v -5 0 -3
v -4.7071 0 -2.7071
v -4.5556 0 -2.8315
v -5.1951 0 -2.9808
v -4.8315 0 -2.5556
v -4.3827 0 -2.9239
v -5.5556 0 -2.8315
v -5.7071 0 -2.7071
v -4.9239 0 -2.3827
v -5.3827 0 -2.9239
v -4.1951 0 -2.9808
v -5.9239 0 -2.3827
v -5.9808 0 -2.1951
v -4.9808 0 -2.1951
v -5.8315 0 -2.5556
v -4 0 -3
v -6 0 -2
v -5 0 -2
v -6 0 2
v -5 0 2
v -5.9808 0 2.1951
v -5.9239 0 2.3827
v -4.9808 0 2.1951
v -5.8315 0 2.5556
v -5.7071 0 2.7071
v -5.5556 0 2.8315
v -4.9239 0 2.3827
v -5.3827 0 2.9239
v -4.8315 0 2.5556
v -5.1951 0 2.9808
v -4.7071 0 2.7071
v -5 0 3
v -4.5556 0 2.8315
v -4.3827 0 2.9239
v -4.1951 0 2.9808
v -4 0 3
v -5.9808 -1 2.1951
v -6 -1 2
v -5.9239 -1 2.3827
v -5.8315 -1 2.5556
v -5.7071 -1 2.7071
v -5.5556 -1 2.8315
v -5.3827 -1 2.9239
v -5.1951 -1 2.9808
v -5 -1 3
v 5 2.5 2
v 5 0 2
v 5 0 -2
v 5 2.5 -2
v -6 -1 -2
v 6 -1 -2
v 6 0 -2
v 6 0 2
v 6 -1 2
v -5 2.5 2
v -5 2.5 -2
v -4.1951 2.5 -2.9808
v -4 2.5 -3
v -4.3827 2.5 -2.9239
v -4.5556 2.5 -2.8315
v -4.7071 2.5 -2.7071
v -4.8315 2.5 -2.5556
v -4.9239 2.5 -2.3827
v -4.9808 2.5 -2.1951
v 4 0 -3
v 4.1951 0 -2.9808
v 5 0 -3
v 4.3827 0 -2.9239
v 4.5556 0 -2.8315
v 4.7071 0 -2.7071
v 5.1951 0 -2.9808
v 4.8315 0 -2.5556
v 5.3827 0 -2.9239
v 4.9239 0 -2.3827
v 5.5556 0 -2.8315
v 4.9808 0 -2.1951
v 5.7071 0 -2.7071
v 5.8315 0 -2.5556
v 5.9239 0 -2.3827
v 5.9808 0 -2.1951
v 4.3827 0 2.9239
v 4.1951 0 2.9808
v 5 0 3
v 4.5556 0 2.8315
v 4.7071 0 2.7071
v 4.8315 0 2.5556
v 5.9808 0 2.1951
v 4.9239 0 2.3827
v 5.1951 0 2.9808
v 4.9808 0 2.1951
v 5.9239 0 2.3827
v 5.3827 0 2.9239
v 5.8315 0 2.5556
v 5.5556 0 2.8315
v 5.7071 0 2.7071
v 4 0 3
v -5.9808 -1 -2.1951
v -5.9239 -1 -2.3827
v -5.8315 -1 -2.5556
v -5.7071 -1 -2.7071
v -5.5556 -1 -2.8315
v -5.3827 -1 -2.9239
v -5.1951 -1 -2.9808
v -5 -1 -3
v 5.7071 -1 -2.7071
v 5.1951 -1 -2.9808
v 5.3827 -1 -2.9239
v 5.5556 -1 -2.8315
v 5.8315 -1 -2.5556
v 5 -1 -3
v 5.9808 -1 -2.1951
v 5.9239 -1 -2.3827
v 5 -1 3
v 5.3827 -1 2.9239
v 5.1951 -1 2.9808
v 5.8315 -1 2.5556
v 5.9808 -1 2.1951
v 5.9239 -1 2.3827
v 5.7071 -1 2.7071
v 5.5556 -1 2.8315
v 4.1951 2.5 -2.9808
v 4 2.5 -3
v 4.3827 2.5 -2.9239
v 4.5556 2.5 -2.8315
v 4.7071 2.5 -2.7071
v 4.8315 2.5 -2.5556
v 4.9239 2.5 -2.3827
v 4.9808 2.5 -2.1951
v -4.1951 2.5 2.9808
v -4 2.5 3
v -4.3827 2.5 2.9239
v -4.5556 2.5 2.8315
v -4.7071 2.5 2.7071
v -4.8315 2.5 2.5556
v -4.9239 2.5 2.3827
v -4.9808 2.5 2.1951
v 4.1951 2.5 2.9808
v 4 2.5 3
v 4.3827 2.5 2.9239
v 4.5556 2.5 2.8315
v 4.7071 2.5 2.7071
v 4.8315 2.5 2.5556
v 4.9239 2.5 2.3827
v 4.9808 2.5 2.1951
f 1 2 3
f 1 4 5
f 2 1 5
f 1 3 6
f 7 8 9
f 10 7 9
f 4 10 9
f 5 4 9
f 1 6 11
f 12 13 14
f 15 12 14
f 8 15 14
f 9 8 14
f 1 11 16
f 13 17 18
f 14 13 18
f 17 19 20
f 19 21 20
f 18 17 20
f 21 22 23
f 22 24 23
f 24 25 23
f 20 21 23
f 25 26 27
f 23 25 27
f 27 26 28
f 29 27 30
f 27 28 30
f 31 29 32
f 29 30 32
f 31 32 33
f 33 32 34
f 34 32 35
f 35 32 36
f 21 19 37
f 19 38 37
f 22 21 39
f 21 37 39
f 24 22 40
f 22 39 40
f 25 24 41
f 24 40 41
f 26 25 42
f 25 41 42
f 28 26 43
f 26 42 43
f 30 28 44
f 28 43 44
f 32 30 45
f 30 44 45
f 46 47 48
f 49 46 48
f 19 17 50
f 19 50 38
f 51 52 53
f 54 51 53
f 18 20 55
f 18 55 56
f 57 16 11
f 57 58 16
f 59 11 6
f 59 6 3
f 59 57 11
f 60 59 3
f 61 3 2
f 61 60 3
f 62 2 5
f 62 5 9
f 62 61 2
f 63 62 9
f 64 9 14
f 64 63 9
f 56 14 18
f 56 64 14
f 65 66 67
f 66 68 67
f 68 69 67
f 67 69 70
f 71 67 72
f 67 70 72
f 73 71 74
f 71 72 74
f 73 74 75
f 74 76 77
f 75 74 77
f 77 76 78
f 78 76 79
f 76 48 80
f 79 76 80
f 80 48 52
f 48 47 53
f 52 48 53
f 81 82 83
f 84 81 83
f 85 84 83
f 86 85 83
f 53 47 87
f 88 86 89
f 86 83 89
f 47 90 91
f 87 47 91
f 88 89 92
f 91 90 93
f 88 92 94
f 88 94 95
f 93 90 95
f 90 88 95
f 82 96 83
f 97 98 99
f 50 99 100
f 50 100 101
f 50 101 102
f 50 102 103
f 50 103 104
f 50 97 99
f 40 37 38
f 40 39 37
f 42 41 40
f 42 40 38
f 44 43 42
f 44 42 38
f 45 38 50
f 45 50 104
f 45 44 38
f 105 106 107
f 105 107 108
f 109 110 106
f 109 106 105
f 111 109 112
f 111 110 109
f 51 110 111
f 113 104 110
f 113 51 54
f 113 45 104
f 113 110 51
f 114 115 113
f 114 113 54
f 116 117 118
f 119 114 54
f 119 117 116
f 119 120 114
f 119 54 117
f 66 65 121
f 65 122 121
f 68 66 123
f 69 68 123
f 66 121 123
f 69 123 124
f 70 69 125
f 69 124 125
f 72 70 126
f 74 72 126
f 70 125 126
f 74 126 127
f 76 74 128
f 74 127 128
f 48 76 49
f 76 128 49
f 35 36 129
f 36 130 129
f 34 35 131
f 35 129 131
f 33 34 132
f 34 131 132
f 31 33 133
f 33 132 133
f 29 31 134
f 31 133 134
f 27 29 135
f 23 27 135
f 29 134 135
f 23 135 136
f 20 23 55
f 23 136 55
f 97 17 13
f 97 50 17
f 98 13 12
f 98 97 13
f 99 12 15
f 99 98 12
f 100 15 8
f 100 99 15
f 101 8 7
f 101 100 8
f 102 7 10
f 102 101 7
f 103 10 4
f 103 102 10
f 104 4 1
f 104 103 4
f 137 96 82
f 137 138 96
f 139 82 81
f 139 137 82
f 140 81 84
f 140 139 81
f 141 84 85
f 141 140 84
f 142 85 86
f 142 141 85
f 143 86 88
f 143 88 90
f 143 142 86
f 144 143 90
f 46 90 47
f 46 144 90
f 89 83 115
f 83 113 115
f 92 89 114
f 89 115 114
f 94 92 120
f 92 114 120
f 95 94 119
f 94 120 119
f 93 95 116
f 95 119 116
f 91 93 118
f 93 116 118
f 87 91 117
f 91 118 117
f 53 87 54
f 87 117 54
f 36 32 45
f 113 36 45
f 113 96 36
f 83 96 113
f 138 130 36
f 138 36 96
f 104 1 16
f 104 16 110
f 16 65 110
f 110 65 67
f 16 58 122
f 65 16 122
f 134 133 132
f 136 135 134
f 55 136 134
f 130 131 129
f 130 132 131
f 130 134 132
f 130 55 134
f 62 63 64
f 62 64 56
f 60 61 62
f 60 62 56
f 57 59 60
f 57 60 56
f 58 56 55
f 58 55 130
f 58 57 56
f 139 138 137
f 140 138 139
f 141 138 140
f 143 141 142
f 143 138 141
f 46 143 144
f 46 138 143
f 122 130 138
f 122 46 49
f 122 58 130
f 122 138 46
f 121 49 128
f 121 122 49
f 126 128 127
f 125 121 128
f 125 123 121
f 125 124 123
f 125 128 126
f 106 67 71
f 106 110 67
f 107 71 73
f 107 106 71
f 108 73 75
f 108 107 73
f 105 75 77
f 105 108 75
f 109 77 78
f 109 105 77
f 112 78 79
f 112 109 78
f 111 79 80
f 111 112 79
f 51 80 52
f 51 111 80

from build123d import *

# Parameters (mm, degrees)
SKETCH1_W           = 10
SKETCH1_H           = 6
BOSS_EXTRUDE1_DEPTH = 2.5
SKETCH2_W           = 12
SKETCH2_H           = 6
BOSS_EXTRUDE2_DEPTH = 1
FILLET1_R           = 1


with BuildPart() as part:
    # Sketch1 → Boss-Extrude1 (new body)
    with BuildSketch(Plane(origin=(0, 0, 0), x_dir=(1, 0, 0), z_dir=(0, 1, 0))):
        Rectangle(SKETCH1_W, SKETCH1_H)
    extrude(amount=BOSS_EXTRUDE1_DEPTH)

    # Sketch2 → Boss-Extrude2 (add)
    with BuildSketch(Plane.XZ):
        Rectangle(SKETCH2_W, SKETCH2_H)
    extrude(amount=BOSS_EXTRUDE2_DEPTH)

    # Fillet1
    fillet1_edges = [part.edges().sort_by_distance(p)[0] for p in [
        (6, -0.5, 3),
        (-6, -0.5, 3),
        (-5, 1.25, 3),
        (5, 1.25, 3),
        (6, -0.5, -3),
        (-6, -0.5, -3),
        (5, 1.25, -3),
        (-5, 1.25, -3),
    ]]
    fillet(fillet1_edges, radius=FILLET1_R)


solid = part.part
